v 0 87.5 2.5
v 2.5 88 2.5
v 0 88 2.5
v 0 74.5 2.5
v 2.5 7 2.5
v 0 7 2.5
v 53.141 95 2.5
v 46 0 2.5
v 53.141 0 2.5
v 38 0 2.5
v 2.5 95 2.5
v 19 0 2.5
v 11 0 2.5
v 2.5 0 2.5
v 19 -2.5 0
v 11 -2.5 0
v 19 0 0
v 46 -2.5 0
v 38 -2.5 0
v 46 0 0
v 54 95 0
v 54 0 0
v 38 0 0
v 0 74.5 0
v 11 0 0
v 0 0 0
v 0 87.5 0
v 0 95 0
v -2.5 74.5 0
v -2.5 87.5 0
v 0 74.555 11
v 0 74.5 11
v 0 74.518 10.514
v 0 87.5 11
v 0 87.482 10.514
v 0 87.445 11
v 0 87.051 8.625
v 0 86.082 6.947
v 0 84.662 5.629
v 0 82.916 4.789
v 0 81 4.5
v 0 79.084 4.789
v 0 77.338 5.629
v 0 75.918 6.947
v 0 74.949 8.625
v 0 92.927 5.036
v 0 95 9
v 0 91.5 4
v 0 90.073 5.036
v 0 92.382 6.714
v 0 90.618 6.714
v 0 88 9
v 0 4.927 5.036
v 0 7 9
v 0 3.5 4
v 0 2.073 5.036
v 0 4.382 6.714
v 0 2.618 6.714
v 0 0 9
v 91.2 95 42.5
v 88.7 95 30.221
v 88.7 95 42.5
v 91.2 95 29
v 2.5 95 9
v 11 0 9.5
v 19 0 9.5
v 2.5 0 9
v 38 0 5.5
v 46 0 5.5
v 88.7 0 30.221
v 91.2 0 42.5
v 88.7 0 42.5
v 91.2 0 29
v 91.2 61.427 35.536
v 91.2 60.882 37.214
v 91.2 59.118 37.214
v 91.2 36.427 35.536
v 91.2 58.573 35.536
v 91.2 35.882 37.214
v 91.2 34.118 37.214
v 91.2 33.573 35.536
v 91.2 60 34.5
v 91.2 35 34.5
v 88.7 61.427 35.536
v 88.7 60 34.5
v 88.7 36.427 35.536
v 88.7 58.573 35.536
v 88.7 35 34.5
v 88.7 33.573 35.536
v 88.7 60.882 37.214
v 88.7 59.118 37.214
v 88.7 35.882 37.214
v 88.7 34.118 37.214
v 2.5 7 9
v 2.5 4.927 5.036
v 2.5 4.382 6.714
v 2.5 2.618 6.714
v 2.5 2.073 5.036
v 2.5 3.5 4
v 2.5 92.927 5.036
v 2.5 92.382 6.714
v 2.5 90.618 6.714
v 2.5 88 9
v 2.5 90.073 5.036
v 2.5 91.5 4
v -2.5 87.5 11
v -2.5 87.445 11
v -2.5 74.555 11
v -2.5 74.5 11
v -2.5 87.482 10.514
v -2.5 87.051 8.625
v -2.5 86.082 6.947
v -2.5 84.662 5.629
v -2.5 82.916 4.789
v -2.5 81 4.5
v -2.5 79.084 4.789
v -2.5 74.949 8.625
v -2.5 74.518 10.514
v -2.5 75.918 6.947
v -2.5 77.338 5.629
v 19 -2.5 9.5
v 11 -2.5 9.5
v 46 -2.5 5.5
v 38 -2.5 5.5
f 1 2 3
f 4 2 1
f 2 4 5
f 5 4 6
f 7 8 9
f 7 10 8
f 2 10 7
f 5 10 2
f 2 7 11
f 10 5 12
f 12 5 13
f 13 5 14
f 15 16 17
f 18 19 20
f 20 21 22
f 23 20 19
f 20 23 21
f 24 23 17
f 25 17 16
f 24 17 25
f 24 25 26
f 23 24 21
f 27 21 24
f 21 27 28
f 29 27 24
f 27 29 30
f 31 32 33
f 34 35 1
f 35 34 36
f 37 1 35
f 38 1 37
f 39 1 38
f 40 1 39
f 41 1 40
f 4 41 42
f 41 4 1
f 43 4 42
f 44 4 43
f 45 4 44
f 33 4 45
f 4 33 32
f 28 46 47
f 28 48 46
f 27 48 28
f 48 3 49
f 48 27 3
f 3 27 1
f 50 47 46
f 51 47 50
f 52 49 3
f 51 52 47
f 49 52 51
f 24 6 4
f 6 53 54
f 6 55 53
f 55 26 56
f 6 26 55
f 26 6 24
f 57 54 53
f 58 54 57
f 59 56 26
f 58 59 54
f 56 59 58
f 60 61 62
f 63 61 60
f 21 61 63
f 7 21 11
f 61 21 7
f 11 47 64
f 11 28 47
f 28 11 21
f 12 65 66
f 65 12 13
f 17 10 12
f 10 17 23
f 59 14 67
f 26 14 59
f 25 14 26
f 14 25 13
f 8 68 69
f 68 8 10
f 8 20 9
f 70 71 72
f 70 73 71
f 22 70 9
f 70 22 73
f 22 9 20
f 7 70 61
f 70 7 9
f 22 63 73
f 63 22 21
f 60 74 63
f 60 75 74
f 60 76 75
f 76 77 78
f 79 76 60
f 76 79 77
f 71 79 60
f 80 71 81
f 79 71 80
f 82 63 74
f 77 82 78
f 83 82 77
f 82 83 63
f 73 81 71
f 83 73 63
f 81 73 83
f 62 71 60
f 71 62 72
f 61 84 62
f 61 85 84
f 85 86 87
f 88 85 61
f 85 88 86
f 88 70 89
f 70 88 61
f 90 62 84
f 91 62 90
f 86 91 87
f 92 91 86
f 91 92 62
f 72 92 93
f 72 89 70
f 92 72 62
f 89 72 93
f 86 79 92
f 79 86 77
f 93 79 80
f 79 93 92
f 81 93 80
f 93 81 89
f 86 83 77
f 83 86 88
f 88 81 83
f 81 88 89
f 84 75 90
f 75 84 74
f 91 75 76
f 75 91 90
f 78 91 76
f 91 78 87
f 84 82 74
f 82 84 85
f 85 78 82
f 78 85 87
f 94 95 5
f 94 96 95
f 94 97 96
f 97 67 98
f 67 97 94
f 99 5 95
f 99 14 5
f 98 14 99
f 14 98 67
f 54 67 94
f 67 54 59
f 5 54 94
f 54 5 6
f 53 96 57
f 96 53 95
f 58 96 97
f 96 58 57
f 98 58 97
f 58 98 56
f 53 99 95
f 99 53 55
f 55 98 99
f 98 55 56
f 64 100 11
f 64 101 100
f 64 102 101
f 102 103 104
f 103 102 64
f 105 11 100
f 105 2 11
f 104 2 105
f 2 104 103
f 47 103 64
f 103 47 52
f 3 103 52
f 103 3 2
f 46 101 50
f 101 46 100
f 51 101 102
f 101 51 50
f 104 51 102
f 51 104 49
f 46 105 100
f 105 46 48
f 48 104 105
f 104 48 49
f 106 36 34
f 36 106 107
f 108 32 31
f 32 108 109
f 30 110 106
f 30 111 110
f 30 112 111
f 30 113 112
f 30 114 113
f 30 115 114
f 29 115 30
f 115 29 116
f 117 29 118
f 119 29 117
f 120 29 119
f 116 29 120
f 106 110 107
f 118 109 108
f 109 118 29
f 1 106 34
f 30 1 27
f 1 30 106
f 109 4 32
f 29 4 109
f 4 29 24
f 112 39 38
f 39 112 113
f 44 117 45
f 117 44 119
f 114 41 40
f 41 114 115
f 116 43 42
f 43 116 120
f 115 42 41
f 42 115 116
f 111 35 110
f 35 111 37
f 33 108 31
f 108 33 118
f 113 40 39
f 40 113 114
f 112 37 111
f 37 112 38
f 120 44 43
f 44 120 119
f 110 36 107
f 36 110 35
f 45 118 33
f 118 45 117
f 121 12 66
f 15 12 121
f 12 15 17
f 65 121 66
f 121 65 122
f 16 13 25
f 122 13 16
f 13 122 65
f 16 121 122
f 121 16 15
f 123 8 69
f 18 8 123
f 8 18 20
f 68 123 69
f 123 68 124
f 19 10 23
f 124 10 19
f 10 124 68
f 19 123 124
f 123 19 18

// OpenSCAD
w = 2.5;
dt = 1;
mistake = 1.5;


//       _________h1_____________
//      |                       | ___
//      |                      /   |
//   d1 |                     /    d2
//      |____________________/    _|_
//              h2
w1 = 93+2*w+2*dt;
w2 = w1 - 2*w;
h1 = 87.2+2*w+mistake;
d1 = 40+2*w;
h2 = 50+2*w+mistake;
d2 = 25+2*w-1;


dh =h1-h2;
alpha = atan(d2/dh);
l = sqrt(d2*d2+dh*dh);
difference()
{
    union()
    {
        cube([h2-w, w2, w]);
        translate([h2-w, 0, 0]) rotate([0, -alpha, 0]) 
        {
            cube([l,w2,w]);
            translate([l/2, w2/2, w+1]) rotate([0, 0, -90]) scale([ 1/2, 1/2, 1/128]) 
                #surface(file = "sig_bw.png", invert=true, center=true, convexity = 5);
        }
        translate([h1-2*w, 0, d2]) cube([w, w2, d1-d2-w]);
    }
        
     for (i=[35, w2-35])
         translate([h1-2*w, i, d2+7])
            rotate([0, 90, 0])  cylinder(h=w, d=3);
}   

// screws
for (i=[0, w2-7])
    translate([0, i, 0,])
        difference() 
        {
          cube([w, 7, 9]);
          translate([0, 3.5, 5.5]) rotate([0, 90, 0])  cylinder(h=w, d=3);
        }

//antenna
difference(){
    translate([-w, w2-(16-3+dt+(13/2)), 0]) cube([w, 13, 11]);        
    translate([-w, w2-(16-3+dt), 11]) rotate([0, 90, 0]) cylinder(h=w, d= 13);  
}    

// usb
translate([12+mistake-w, -w, 0]) cube([8, w, d1-w-37+4]);
translate([39+mistake-w, -w, 0]) cube([8, w, d1-w-37]);
